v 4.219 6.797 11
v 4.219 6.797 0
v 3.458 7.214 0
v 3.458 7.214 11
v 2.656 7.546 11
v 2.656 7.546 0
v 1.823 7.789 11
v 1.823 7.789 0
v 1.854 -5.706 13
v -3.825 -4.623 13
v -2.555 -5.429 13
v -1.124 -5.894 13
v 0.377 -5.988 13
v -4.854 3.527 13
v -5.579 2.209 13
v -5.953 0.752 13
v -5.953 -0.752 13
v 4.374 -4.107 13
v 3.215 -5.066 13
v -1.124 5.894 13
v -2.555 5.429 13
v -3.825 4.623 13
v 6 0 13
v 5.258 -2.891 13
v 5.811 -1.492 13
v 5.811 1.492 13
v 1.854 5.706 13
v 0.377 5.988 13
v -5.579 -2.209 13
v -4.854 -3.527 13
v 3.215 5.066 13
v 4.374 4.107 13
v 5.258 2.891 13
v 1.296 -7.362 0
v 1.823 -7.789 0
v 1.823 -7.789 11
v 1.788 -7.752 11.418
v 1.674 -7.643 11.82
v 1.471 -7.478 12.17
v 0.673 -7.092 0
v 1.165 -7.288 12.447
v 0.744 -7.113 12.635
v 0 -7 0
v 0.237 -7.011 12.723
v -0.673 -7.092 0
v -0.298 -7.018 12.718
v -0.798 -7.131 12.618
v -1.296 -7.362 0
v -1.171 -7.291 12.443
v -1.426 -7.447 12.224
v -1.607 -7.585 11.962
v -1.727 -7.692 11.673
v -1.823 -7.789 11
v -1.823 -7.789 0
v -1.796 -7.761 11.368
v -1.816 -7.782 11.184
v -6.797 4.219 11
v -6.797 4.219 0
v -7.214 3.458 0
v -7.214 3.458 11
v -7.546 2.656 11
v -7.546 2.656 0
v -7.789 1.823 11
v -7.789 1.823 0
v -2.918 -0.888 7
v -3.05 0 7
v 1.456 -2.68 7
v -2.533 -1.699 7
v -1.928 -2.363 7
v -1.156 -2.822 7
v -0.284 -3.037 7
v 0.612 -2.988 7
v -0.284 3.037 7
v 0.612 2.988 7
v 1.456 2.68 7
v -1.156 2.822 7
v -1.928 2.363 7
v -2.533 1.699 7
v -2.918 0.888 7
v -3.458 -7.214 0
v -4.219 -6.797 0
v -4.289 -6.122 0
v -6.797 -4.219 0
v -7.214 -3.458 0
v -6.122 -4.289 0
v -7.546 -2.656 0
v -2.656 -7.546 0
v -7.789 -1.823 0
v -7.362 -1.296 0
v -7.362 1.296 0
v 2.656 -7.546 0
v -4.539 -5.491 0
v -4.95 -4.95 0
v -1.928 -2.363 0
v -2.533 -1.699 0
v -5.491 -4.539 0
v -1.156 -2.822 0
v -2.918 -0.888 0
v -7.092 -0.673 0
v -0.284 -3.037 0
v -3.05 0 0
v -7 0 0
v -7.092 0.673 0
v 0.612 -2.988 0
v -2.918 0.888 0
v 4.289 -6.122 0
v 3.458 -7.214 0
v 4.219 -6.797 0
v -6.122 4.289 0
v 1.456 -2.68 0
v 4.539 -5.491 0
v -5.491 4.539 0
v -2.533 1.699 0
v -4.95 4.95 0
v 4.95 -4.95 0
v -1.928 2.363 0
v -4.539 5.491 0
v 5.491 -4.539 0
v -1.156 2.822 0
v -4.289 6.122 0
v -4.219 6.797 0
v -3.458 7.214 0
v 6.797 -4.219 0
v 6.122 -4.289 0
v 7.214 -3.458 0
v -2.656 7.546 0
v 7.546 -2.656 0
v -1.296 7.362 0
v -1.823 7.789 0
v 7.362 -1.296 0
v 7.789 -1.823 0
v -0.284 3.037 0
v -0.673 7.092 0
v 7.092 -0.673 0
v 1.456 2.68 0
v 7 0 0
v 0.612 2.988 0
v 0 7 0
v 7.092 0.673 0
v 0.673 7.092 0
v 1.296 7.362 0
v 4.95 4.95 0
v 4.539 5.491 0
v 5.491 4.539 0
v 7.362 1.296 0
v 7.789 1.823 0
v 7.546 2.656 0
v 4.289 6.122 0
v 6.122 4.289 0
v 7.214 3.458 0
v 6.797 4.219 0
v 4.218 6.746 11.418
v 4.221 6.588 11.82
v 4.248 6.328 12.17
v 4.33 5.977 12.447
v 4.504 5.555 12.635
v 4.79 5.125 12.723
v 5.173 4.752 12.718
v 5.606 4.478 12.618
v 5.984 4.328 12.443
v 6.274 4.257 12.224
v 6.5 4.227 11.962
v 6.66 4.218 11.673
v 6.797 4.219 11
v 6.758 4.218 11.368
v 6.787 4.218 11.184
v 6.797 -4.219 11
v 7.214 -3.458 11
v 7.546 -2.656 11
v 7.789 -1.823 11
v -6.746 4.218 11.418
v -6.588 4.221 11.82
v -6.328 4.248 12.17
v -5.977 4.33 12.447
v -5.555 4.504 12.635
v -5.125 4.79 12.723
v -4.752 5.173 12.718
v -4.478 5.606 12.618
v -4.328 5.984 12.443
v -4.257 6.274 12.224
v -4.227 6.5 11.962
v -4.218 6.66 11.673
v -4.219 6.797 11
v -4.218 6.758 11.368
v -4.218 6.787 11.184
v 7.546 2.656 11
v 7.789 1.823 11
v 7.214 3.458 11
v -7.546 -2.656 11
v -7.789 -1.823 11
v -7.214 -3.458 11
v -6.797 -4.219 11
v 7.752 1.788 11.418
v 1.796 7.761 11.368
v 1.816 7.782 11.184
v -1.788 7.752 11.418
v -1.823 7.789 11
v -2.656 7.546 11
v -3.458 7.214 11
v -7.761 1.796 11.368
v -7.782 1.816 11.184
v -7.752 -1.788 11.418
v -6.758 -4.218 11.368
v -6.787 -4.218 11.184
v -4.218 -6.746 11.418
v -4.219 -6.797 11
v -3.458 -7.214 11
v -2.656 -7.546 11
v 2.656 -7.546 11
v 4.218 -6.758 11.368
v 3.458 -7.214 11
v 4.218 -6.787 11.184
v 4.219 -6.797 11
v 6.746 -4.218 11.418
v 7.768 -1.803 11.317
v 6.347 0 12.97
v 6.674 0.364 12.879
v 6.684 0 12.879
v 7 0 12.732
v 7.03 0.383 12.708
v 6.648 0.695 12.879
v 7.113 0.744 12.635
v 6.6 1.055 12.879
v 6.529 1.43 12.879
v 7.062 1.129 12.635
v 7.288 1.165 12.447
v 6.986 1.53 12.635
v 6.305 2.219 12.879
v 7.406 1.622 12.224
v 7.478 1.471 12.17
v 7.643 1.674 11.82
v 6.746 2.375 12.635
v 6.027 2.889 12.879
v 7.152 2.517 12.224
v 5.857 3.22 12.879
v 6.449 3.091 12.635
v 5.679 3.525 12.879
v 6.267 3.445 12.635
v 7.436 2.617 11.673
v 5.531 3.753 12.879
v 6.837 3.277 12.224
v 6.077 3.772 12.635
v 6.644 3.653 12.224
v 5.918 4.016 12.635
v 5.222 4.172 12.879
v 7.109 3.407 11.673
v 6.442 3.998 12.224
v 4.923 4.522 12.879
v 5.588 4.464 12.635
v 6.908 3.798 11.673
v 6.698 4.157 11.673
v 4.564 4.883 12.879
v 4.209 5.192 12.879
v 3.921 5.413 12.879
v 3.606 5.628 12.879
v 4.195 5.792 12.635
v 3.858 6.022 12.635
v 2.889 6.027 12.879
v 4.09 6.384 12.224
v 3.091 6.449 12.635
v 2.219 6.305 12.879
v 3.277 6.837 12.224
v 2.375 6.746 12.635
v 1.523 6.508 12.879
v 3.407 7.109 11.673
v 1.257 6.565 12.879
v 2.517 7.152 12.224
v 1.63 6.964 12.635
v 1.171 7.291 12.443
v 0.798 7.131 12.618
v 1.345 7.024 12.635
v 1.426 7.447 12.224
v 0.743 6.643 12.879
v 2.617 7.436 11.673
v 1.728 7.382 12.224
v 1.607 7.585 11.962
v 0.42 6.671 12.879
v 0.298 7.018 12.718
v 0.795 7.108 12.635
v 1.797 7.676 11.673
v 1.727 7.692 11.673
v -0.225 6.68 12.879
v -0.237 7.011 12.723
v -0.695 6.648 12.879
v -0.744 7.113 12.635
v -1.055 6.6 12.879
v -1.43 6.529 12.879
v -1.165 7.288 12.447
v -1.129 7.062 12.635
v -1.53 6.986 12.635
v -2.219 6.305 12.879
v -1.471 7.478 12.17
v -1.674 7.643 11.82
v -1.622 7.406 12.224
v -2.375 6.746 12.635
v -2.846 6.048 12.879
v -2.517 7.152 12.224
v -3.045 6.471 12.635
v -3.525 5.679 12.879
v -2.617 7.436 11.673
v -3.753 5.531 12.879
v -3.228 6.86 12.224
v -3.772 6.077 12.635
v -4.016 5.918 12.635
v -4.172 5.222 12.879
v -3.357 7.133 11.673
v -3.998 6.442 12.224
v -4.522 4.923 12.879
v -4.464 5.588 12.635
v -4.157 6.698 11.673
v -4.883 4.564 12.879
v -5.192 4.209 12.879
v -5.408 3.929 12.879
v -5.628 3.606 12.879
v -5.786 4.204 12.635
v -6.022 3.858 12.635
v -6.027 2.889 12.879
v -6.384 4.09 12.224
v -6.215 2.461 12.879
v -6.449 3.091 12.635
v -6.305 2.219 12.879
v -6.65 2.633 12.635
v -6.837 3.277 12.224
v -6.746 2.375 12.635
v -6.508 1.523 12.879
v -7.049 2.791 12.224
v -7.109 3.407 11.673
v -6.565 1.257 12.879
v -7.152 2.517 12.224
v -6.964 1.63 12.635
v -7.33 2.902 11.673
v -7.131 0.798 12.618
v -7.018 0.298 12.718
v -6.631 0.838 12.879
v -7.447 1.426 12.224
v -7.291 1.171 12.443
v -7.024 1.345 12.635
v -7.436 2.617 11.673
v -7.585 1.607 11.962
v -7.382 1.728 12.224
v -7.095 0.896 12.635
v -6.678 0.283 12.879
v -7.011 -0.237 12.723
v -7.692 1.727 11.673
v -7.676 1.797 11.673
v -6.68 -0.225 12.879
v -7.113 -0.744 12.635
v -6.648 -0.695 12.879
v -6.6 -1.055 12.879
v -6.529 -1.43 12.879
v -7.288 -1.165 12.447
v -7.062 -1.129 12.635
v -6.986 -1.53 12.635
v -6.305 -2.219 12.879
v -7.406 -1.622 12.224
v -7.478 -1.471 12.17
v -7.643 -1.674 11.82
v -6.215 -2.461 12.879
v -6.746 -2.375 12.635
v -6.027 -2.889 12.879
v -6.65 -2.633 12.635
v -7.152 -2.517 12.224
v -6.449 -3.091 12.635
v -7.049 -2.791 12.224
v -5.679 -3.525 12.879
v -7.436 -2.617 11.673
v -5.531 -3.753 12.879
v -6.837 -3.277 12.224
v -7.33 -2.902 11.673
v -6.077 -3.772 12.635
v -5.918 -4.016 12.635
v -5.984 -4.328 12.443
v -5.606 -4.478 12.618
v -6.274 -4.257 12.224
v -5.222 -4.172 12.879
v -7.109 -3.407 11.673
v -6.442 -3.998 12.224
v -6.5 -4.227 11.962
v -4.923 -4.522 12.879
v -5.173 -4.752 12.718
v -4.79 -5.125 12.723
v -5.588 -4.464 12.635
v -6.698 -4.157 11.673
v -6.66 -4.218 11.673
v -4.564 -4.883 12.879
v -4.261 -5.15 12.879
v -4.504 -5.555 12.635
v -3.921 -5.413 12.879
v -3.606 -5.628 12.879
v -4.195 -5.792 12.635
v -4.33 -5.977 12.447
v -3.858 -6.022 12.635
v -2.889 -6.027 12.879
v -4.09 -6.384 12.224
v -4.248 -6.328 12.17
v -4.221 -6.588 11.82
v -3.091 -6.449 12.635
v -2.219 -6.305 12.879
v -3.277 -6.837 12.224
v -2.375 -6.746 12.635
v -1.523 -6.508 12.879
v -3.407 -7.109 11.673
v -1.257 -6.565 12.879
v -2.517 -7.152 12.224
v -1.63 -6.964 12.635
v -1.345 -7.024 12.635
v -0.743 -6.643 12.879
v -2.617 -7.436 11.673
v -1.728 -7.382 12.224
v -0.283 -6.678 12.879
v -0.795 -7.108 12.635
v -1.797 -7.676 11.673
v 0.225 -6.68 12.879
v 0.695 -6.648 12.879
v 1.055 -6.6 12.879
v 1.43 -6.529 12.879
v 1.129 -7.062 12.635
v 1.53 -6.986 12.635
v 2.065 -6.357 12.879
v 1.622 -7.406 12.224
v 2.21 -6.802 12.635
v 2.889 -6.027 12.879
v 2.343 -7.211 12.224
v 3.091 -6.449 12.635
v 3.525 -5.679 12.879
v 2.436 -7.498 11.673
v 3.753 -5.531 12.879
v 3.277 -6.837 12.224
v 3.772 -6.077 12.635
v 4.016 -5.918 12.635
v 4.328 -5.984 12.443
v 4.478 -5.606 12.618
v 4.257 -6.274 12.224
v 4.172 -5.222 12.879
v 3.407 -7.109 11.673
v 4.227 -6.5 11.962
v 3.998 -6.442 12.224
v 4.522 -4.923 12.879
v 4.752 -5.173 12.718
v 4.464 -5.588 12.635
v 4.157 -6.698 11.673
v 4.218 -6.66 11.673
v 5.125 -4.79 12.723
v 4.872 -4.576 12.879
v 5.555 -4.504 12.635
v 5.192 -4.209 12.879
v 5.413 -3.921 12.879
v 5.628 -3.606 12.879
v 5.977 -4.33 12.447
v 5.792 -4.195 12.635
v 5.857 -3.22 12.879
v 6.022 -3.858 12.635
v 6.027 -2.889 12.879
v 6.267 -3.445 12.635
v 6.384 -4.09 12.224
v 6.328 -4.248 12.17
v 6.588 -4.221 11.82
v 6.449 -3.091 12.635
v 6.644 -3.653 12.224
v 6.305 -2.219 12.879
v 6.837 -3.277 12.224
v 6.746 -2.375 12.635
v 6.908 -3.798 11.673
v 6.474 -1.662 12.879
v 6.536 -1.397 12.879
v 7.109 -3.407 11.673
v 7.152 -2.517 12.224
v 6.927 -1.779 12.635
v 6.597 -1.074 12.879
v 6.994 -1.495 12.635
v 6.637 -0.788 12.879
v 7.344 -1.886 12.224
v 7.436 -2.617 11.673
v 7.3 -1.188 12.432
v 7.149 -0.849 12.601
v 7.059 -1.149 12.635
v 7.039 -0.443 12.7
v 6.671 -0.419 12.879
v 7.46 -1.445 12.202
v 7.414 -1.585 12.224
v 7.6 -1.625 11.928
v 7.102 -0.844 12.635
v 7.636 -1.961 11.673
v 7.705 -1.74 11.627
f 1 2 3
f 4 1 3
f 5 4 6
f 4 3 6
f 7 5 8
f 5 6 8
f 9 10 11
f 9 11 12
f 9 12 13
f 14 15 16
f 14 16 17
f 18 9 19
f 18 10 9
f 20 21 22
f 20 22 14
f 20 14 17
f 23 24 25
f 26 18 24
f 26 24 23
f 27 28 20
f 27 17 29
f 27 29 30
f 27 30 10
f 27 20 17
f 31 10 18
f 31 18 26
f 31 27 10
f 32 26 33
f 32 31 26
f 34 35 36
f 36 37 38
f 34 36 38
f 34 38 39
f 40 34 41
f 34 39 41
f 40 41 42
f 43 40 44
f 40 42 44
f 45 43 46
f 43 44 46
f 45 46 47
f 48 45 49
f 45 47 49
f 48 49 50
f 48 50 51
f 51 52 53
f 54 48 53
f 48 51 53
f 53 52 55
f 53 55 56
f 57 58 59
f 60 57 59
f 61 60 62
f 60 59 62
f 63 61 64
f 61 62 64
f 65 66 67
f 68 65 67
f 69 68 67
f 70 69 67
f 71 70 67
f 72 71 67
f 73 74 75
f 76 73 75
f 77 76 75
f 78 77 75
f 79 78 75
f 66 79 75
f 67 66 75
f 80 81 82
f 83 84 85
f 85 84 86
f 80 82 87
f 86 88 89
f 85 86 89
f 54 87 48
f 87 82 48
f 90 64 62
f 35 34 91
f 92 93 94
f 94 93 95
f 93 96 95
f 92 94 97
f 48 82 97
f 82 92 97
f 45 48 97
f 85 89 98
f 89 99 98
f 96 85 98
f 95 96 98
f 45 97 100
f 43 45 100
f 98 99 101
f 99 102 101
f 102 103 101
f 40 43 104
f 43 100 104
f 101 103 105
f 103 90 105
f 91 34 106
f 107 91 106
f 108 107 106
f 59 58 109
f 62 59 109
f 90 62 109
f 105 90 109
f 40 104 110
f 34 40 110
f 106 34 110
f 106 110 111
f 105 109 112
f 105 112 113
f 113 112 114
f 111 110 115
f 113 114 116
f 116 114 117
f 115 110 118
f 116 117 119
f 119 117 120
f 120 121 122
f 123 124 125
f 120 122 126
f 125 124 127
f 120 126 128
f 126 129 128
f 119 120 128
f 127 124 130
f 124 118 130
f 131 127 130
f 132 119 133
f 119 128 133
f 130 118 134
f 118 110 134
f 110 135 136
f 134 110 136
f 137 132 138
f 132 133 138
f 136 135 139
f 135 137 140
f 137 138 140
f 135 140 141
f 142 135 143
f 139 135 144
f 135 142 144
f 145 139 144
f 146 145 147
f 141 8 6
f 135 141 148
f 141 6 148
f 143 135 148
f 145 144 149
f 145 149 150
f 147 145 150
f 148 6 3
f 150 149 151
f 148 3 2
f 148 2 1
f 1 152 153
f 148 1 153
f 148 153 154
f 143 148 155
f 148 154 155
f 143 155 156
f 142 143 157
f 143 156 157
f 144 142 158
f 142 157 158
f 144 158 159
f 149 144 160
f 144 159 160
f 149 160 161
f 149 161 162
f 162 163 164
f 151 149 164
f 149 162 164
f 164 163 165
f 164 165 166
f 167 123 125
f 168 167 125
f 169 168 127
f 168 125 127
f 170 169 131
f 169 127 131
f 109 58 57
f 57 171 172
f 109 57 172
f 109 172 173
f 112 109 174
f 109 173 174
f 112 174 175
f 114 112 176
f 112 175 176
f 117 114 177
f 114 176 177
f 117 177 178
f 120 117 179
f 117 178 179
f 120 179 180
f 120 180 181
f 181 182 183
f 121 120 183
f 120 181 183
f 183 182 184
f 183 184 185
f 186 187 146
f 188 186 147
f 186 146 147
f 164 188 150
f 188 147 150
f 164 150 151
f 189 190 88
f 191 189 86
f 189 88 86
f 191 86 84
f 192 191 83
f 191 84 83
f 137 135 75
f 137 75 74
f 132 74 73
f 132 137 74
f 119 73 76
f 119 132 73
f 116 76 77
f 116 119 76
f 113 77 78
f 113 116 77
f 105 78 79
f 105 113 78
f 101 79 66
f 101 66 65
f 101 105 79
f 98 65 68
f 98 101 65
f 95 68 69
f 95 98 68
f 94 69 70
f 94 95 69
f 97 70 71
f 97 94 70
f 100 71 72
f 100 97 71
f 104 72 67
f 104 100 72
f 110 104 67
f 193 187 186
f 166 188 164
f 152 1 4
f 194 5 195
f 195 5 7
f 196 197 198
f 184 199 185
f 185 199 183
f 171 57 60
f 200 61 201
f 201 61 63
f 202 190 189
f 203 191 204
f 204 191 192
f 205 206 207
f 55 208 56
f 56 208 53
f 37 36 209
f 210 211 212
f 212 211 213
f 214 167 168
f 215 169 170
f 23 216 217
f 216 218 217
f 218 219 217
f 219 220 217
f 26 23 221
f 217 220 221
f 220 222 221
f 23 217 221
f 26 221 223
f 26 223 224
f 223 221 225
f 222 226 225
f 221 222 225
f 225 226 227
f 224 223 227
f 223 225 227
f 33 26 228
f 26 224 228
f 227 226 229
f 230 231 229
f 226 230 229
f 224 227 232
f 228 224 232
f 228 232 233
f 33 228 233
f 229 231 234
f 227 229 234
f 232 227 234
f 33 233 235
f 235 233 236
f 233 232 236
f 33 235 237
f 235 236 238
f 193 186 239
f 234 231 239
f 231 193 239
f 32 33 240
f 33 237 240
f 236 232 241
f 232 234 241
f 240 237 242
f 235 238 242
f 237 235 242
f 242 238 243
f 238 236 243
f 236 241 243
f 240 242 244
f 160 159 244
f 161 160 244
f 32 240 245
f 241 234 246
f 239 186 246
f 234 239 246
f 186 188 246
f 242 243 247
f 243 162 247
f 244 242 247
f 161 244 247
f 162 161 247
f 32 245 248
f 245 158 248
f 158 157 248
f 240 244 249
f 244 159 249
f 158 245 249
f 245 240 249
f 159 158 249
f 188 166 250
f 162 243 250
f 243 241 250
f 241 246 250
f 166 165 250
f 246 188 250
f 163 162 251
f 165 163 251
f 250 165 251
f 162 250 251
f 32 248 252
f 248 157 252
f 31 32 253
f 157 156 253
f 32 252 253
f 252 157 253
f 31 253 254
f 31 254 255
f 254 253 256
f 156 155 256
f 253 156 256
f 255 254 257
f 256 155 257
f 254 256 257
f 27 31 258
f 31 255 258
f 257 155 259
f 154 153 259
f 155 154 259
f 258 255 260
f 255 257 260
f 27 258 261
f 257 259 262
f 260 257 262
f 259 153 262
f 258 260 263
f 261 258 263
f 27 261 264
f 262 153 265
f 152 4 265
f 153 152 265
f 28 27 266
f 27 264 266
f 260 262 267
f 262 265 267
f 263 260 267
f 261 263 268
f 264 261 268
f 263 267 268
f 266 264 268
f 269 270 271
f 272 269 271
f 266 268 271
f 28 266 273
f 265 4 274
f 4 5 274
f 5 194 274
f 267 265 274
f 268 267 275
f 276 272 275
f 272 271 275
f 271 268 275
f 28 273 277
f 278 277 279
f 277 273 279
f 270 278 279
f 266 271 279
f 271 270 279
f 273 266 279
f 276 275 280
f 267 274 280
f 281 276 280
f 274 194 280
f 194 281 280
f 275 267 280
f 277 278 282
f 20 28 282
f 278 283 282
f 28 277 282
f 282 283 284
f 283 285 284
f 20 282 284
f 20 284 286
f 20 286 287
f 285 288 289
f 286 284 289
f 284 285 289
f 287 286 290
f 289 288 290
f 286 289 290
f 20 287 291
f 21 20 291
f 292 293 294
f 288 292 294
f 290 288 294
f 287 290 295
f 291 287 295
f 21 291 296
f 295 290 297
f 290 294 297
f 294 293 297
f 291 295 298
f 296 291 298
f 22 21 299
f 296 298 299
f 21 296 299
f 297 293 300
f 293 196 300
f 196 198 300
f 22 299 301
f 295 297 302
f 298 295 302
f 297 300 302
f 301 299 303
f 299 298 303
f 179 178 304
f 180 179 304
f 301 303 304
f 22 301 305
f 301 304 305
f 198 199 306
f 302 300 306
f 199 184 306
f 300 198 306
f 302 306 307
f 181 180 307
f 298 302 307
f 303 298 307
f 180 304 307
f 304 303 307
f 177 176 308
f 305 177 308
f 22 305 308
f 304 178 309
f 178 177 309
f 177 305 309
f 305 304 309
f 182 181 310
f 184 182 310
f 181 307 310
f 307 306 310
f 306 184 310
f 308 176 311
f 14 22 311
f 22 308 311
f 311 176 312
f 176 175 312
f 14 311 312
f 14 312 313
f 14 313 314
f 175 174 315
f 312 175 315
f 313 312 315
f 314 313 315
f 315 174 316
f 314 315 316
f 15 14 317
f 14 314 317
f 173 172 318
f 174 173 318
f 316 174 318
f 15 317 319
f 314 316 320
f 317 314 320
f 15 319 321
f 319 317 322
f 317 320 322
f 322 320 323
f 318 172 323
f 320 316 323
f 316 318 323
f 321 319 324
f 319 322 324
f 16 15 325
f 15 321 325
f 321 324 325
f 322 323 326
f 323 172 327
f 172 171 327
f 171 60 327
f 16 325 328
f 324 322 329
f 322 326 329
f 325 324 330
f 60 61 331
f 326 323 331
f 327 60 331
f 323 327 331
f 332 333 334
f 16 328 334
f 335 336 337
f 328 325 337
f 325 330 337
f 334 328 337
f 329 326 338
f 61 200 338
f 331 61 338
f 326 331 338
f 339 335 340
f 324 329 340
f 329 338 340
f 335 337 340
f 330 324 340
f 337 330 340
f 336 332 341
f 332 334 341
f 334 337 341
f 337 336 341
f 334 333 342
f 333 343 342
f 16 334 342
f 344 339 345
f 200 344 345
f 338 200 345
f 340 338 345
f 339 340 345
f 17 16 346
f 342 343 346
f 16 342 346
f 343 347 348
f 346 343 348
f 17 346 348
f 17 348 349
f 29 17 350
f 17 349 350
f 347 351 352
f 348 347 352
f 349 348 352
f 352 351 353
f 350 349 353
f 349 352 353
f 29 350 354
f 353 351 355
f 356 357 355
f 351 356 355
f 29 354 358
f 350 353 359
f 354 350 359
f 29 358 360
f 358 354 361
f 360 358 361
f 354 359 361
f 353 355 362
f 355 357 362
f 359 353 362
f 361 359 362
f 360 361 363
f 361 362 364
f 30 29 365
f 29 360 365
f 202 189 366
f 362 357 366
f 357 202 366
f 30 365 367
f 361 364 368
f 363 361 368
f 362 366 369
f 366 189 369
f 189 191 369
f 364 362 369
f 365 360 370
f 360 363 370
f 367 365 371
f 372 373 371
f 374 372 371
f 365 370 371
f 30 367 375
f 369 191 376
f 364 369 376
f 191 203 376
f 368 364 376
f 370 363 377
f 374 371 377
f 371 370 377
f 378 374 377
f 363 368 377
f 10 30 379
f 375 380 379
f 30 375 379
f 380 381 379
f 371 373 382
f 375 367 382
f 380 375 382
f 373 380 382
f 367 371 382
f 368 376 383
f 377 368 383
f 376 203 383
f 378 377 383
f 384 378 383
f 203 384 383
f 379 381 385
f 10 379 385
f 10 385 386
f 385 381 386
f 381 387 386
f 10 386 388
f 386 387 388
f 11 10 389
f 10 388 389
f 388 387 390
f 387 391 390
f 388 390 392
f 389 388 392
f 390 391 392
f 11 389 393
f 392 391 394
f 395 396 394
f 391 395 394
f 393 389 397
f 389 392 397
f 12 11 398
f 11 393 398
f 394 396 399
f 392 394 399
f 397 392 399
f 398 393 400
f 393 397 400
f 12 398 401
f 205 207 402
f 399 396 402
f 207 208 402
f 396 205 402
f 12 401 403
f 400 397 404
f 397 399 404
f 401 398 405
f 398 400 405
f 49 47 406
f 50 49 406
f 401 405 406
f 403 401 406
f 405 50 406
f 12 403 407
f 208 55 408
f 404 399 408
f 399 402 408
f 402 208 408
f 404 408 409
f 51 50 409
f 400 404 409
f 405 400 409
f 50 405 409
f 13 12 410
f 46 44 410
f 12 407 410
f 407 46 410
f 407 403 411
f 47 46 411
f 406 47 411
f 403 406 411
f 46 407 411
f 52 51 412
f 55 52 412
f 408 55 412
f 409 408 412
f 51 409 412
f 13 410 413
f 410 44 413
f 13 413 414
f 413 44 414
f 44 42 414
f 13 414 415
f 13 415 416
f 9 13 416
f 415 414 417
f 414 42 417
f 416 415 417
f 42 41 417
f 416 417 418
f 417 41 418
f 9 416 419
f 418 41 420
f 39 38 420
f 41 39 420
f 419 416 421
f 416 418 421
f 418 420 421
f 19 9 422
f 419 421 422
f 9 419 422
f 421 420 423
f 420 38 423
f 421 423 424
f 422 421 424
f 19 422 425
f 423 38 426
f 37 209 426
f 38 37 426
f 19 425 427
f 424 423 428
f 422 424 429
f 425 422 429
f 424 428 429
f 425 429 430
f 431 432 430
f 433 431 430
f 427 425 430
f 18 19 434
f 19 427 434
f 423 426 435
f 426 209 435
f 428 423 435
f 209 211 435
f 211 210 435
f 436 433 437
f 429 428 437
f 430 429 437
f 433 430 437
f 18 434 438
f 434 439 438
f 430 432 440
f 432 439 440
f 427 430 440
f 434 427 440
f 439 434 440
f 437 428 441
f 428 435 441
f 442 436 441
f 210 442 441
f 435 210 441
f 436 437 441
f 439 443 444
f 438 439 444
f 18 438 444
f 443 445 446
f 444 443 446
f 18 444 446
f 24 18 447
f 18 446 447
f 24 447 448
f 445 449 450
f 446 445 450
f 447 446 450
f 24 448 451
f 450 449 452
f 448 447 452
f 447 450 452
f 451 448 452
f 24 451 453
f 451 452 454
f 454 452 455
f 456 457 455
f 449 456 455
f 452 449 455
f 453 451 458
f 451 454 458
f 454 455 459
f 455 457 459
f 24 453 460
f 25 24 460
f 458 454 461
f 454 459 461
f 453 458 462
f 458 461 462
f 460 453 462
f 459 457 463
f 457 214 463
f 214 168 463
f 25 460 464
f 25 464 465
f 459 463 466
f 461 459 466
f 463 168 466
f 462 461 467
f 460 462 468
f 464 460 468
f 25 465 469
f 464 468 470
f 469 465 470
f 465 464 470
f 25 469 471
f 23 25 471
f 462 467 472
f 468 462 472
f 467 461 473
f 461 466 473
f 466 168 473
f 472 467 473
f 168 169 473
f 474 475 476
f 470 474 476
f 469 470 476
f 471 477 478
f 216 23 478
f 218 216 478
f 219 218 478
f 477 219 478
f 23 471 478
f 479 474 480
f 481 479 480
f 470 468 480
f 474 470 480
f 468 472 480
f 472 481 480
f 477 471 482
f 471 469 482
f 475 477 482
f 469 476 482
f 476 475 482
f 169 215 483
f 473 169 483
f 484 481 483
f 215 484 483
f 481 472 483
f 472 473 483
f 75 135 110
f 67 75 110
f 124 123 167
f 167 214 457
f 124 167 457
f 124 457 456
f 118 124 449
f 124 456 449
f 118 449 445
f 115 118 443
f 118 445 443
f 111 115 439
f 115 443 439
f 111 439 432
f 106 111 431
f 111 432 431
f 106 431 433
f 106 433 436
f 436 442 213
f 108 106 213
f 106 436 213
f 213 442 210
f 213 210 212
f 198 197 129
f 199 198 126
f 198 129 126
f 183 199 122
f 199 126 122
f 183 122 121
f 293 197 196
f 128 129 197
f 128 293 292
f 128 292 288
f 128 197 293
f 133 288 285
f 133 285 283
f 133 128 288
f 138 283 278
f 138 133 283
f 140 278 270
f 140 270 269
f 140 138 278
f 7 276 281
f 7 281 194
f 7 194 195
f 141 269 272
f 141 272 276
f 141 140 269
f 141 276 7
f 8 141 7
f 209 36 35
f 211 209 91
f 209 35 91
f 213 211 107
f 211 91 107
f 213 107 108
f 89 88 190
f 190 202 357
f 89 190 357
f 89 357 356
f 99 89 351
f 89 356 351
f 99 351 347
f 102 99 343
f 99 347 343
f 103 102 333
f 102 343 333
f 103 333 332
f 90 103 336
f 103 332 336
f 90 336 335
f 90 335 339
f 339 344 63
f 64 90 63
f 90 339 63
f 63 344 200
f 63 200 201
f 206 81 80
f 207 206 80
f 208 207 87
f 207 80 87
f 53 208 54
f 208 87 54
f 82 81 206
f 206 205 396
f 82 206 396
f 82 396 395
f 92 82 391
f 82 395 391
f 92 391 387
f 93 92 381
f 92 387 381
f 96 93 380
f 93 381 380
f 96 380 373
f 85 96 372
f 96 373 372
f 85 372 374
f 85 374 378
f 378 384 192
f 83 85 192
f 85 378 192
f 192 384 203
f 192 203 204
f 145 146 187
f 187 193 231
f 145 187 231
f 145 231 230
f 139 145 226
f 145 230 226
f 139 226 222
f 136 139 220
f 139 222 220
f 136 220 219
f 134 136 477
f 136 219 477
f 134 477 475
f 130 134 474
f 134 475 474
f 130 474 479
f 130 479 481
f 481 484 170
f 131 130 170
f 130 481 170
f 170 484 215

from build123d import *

# Parameters (mm, degrees)
SKETCH_R           = 8
PAD_DEPTH          = 13
SKETCH001_R        = 3.05
PAD001_DEPTH       = 6
FILLET_R           = 2
SKETCH002_R        = 2.5
POCKET_DEPTH       = 52.192953
POCKET_DEPTH_BACK  = 65.192953
POLARPATTERN_COUNT = 8


with BuildPart() as part:
    # Sketch → Pad (new body)
    with BuildSketch(Plane.XY):
        Circle(SKETCH_R)
        with BuildLine():
            ThreePointArc((1.456056, 2.68), (-3.05, 0), (1.456056, -2.68))
            Line((1.456056, 2.68), (1.456056, -2.68))
        make_face(mode=Mode.SUBTRACT)
    extrude(amount=PAD_DEPTH)

    # Sketch001 (on Face5 of Pad) → Pad001 (join)
    with BuildSketch(Plane.XY.offset(13)):
        Circle(SKETCH001_R)
    extrude(amount=-PAD001_DEPTH)

    # Fillet
    fillet_edges = [part.edges().sort_by_distance(p)[0] for p in [
        (-8, 0, 13),
    ]]
    fillet(fillet_edges, radius=FILLET_R)

    # Sketch002 → Pocket (cut, two sides)
    with BuildSketch(Plane.XY) as pocket_sk:
        with Locations((0, 9.5)):
            Circle(SKETCH002_R)
    pocket = extrude(amount=-POCKET_DEPTH, mode=Mode.SUBTRACT) + extrude(pocket_sk.sketch, amount=POCKET_DEPTH_BACK, mode=Mode.SUBTRACT)

    # PolarPattern: Pocket ×8 about axis
    polarpattern_axis = Axis((0, 0, 0), (0, 0, 1))
    for i in range(1, POLARPATTERN_COUNT):
        add(pocket.rotate(polarpattern_axis, i * 360 / POLARPATTERN_COUNT), mode=Mode.SUBTRACT)


solid = part.part
